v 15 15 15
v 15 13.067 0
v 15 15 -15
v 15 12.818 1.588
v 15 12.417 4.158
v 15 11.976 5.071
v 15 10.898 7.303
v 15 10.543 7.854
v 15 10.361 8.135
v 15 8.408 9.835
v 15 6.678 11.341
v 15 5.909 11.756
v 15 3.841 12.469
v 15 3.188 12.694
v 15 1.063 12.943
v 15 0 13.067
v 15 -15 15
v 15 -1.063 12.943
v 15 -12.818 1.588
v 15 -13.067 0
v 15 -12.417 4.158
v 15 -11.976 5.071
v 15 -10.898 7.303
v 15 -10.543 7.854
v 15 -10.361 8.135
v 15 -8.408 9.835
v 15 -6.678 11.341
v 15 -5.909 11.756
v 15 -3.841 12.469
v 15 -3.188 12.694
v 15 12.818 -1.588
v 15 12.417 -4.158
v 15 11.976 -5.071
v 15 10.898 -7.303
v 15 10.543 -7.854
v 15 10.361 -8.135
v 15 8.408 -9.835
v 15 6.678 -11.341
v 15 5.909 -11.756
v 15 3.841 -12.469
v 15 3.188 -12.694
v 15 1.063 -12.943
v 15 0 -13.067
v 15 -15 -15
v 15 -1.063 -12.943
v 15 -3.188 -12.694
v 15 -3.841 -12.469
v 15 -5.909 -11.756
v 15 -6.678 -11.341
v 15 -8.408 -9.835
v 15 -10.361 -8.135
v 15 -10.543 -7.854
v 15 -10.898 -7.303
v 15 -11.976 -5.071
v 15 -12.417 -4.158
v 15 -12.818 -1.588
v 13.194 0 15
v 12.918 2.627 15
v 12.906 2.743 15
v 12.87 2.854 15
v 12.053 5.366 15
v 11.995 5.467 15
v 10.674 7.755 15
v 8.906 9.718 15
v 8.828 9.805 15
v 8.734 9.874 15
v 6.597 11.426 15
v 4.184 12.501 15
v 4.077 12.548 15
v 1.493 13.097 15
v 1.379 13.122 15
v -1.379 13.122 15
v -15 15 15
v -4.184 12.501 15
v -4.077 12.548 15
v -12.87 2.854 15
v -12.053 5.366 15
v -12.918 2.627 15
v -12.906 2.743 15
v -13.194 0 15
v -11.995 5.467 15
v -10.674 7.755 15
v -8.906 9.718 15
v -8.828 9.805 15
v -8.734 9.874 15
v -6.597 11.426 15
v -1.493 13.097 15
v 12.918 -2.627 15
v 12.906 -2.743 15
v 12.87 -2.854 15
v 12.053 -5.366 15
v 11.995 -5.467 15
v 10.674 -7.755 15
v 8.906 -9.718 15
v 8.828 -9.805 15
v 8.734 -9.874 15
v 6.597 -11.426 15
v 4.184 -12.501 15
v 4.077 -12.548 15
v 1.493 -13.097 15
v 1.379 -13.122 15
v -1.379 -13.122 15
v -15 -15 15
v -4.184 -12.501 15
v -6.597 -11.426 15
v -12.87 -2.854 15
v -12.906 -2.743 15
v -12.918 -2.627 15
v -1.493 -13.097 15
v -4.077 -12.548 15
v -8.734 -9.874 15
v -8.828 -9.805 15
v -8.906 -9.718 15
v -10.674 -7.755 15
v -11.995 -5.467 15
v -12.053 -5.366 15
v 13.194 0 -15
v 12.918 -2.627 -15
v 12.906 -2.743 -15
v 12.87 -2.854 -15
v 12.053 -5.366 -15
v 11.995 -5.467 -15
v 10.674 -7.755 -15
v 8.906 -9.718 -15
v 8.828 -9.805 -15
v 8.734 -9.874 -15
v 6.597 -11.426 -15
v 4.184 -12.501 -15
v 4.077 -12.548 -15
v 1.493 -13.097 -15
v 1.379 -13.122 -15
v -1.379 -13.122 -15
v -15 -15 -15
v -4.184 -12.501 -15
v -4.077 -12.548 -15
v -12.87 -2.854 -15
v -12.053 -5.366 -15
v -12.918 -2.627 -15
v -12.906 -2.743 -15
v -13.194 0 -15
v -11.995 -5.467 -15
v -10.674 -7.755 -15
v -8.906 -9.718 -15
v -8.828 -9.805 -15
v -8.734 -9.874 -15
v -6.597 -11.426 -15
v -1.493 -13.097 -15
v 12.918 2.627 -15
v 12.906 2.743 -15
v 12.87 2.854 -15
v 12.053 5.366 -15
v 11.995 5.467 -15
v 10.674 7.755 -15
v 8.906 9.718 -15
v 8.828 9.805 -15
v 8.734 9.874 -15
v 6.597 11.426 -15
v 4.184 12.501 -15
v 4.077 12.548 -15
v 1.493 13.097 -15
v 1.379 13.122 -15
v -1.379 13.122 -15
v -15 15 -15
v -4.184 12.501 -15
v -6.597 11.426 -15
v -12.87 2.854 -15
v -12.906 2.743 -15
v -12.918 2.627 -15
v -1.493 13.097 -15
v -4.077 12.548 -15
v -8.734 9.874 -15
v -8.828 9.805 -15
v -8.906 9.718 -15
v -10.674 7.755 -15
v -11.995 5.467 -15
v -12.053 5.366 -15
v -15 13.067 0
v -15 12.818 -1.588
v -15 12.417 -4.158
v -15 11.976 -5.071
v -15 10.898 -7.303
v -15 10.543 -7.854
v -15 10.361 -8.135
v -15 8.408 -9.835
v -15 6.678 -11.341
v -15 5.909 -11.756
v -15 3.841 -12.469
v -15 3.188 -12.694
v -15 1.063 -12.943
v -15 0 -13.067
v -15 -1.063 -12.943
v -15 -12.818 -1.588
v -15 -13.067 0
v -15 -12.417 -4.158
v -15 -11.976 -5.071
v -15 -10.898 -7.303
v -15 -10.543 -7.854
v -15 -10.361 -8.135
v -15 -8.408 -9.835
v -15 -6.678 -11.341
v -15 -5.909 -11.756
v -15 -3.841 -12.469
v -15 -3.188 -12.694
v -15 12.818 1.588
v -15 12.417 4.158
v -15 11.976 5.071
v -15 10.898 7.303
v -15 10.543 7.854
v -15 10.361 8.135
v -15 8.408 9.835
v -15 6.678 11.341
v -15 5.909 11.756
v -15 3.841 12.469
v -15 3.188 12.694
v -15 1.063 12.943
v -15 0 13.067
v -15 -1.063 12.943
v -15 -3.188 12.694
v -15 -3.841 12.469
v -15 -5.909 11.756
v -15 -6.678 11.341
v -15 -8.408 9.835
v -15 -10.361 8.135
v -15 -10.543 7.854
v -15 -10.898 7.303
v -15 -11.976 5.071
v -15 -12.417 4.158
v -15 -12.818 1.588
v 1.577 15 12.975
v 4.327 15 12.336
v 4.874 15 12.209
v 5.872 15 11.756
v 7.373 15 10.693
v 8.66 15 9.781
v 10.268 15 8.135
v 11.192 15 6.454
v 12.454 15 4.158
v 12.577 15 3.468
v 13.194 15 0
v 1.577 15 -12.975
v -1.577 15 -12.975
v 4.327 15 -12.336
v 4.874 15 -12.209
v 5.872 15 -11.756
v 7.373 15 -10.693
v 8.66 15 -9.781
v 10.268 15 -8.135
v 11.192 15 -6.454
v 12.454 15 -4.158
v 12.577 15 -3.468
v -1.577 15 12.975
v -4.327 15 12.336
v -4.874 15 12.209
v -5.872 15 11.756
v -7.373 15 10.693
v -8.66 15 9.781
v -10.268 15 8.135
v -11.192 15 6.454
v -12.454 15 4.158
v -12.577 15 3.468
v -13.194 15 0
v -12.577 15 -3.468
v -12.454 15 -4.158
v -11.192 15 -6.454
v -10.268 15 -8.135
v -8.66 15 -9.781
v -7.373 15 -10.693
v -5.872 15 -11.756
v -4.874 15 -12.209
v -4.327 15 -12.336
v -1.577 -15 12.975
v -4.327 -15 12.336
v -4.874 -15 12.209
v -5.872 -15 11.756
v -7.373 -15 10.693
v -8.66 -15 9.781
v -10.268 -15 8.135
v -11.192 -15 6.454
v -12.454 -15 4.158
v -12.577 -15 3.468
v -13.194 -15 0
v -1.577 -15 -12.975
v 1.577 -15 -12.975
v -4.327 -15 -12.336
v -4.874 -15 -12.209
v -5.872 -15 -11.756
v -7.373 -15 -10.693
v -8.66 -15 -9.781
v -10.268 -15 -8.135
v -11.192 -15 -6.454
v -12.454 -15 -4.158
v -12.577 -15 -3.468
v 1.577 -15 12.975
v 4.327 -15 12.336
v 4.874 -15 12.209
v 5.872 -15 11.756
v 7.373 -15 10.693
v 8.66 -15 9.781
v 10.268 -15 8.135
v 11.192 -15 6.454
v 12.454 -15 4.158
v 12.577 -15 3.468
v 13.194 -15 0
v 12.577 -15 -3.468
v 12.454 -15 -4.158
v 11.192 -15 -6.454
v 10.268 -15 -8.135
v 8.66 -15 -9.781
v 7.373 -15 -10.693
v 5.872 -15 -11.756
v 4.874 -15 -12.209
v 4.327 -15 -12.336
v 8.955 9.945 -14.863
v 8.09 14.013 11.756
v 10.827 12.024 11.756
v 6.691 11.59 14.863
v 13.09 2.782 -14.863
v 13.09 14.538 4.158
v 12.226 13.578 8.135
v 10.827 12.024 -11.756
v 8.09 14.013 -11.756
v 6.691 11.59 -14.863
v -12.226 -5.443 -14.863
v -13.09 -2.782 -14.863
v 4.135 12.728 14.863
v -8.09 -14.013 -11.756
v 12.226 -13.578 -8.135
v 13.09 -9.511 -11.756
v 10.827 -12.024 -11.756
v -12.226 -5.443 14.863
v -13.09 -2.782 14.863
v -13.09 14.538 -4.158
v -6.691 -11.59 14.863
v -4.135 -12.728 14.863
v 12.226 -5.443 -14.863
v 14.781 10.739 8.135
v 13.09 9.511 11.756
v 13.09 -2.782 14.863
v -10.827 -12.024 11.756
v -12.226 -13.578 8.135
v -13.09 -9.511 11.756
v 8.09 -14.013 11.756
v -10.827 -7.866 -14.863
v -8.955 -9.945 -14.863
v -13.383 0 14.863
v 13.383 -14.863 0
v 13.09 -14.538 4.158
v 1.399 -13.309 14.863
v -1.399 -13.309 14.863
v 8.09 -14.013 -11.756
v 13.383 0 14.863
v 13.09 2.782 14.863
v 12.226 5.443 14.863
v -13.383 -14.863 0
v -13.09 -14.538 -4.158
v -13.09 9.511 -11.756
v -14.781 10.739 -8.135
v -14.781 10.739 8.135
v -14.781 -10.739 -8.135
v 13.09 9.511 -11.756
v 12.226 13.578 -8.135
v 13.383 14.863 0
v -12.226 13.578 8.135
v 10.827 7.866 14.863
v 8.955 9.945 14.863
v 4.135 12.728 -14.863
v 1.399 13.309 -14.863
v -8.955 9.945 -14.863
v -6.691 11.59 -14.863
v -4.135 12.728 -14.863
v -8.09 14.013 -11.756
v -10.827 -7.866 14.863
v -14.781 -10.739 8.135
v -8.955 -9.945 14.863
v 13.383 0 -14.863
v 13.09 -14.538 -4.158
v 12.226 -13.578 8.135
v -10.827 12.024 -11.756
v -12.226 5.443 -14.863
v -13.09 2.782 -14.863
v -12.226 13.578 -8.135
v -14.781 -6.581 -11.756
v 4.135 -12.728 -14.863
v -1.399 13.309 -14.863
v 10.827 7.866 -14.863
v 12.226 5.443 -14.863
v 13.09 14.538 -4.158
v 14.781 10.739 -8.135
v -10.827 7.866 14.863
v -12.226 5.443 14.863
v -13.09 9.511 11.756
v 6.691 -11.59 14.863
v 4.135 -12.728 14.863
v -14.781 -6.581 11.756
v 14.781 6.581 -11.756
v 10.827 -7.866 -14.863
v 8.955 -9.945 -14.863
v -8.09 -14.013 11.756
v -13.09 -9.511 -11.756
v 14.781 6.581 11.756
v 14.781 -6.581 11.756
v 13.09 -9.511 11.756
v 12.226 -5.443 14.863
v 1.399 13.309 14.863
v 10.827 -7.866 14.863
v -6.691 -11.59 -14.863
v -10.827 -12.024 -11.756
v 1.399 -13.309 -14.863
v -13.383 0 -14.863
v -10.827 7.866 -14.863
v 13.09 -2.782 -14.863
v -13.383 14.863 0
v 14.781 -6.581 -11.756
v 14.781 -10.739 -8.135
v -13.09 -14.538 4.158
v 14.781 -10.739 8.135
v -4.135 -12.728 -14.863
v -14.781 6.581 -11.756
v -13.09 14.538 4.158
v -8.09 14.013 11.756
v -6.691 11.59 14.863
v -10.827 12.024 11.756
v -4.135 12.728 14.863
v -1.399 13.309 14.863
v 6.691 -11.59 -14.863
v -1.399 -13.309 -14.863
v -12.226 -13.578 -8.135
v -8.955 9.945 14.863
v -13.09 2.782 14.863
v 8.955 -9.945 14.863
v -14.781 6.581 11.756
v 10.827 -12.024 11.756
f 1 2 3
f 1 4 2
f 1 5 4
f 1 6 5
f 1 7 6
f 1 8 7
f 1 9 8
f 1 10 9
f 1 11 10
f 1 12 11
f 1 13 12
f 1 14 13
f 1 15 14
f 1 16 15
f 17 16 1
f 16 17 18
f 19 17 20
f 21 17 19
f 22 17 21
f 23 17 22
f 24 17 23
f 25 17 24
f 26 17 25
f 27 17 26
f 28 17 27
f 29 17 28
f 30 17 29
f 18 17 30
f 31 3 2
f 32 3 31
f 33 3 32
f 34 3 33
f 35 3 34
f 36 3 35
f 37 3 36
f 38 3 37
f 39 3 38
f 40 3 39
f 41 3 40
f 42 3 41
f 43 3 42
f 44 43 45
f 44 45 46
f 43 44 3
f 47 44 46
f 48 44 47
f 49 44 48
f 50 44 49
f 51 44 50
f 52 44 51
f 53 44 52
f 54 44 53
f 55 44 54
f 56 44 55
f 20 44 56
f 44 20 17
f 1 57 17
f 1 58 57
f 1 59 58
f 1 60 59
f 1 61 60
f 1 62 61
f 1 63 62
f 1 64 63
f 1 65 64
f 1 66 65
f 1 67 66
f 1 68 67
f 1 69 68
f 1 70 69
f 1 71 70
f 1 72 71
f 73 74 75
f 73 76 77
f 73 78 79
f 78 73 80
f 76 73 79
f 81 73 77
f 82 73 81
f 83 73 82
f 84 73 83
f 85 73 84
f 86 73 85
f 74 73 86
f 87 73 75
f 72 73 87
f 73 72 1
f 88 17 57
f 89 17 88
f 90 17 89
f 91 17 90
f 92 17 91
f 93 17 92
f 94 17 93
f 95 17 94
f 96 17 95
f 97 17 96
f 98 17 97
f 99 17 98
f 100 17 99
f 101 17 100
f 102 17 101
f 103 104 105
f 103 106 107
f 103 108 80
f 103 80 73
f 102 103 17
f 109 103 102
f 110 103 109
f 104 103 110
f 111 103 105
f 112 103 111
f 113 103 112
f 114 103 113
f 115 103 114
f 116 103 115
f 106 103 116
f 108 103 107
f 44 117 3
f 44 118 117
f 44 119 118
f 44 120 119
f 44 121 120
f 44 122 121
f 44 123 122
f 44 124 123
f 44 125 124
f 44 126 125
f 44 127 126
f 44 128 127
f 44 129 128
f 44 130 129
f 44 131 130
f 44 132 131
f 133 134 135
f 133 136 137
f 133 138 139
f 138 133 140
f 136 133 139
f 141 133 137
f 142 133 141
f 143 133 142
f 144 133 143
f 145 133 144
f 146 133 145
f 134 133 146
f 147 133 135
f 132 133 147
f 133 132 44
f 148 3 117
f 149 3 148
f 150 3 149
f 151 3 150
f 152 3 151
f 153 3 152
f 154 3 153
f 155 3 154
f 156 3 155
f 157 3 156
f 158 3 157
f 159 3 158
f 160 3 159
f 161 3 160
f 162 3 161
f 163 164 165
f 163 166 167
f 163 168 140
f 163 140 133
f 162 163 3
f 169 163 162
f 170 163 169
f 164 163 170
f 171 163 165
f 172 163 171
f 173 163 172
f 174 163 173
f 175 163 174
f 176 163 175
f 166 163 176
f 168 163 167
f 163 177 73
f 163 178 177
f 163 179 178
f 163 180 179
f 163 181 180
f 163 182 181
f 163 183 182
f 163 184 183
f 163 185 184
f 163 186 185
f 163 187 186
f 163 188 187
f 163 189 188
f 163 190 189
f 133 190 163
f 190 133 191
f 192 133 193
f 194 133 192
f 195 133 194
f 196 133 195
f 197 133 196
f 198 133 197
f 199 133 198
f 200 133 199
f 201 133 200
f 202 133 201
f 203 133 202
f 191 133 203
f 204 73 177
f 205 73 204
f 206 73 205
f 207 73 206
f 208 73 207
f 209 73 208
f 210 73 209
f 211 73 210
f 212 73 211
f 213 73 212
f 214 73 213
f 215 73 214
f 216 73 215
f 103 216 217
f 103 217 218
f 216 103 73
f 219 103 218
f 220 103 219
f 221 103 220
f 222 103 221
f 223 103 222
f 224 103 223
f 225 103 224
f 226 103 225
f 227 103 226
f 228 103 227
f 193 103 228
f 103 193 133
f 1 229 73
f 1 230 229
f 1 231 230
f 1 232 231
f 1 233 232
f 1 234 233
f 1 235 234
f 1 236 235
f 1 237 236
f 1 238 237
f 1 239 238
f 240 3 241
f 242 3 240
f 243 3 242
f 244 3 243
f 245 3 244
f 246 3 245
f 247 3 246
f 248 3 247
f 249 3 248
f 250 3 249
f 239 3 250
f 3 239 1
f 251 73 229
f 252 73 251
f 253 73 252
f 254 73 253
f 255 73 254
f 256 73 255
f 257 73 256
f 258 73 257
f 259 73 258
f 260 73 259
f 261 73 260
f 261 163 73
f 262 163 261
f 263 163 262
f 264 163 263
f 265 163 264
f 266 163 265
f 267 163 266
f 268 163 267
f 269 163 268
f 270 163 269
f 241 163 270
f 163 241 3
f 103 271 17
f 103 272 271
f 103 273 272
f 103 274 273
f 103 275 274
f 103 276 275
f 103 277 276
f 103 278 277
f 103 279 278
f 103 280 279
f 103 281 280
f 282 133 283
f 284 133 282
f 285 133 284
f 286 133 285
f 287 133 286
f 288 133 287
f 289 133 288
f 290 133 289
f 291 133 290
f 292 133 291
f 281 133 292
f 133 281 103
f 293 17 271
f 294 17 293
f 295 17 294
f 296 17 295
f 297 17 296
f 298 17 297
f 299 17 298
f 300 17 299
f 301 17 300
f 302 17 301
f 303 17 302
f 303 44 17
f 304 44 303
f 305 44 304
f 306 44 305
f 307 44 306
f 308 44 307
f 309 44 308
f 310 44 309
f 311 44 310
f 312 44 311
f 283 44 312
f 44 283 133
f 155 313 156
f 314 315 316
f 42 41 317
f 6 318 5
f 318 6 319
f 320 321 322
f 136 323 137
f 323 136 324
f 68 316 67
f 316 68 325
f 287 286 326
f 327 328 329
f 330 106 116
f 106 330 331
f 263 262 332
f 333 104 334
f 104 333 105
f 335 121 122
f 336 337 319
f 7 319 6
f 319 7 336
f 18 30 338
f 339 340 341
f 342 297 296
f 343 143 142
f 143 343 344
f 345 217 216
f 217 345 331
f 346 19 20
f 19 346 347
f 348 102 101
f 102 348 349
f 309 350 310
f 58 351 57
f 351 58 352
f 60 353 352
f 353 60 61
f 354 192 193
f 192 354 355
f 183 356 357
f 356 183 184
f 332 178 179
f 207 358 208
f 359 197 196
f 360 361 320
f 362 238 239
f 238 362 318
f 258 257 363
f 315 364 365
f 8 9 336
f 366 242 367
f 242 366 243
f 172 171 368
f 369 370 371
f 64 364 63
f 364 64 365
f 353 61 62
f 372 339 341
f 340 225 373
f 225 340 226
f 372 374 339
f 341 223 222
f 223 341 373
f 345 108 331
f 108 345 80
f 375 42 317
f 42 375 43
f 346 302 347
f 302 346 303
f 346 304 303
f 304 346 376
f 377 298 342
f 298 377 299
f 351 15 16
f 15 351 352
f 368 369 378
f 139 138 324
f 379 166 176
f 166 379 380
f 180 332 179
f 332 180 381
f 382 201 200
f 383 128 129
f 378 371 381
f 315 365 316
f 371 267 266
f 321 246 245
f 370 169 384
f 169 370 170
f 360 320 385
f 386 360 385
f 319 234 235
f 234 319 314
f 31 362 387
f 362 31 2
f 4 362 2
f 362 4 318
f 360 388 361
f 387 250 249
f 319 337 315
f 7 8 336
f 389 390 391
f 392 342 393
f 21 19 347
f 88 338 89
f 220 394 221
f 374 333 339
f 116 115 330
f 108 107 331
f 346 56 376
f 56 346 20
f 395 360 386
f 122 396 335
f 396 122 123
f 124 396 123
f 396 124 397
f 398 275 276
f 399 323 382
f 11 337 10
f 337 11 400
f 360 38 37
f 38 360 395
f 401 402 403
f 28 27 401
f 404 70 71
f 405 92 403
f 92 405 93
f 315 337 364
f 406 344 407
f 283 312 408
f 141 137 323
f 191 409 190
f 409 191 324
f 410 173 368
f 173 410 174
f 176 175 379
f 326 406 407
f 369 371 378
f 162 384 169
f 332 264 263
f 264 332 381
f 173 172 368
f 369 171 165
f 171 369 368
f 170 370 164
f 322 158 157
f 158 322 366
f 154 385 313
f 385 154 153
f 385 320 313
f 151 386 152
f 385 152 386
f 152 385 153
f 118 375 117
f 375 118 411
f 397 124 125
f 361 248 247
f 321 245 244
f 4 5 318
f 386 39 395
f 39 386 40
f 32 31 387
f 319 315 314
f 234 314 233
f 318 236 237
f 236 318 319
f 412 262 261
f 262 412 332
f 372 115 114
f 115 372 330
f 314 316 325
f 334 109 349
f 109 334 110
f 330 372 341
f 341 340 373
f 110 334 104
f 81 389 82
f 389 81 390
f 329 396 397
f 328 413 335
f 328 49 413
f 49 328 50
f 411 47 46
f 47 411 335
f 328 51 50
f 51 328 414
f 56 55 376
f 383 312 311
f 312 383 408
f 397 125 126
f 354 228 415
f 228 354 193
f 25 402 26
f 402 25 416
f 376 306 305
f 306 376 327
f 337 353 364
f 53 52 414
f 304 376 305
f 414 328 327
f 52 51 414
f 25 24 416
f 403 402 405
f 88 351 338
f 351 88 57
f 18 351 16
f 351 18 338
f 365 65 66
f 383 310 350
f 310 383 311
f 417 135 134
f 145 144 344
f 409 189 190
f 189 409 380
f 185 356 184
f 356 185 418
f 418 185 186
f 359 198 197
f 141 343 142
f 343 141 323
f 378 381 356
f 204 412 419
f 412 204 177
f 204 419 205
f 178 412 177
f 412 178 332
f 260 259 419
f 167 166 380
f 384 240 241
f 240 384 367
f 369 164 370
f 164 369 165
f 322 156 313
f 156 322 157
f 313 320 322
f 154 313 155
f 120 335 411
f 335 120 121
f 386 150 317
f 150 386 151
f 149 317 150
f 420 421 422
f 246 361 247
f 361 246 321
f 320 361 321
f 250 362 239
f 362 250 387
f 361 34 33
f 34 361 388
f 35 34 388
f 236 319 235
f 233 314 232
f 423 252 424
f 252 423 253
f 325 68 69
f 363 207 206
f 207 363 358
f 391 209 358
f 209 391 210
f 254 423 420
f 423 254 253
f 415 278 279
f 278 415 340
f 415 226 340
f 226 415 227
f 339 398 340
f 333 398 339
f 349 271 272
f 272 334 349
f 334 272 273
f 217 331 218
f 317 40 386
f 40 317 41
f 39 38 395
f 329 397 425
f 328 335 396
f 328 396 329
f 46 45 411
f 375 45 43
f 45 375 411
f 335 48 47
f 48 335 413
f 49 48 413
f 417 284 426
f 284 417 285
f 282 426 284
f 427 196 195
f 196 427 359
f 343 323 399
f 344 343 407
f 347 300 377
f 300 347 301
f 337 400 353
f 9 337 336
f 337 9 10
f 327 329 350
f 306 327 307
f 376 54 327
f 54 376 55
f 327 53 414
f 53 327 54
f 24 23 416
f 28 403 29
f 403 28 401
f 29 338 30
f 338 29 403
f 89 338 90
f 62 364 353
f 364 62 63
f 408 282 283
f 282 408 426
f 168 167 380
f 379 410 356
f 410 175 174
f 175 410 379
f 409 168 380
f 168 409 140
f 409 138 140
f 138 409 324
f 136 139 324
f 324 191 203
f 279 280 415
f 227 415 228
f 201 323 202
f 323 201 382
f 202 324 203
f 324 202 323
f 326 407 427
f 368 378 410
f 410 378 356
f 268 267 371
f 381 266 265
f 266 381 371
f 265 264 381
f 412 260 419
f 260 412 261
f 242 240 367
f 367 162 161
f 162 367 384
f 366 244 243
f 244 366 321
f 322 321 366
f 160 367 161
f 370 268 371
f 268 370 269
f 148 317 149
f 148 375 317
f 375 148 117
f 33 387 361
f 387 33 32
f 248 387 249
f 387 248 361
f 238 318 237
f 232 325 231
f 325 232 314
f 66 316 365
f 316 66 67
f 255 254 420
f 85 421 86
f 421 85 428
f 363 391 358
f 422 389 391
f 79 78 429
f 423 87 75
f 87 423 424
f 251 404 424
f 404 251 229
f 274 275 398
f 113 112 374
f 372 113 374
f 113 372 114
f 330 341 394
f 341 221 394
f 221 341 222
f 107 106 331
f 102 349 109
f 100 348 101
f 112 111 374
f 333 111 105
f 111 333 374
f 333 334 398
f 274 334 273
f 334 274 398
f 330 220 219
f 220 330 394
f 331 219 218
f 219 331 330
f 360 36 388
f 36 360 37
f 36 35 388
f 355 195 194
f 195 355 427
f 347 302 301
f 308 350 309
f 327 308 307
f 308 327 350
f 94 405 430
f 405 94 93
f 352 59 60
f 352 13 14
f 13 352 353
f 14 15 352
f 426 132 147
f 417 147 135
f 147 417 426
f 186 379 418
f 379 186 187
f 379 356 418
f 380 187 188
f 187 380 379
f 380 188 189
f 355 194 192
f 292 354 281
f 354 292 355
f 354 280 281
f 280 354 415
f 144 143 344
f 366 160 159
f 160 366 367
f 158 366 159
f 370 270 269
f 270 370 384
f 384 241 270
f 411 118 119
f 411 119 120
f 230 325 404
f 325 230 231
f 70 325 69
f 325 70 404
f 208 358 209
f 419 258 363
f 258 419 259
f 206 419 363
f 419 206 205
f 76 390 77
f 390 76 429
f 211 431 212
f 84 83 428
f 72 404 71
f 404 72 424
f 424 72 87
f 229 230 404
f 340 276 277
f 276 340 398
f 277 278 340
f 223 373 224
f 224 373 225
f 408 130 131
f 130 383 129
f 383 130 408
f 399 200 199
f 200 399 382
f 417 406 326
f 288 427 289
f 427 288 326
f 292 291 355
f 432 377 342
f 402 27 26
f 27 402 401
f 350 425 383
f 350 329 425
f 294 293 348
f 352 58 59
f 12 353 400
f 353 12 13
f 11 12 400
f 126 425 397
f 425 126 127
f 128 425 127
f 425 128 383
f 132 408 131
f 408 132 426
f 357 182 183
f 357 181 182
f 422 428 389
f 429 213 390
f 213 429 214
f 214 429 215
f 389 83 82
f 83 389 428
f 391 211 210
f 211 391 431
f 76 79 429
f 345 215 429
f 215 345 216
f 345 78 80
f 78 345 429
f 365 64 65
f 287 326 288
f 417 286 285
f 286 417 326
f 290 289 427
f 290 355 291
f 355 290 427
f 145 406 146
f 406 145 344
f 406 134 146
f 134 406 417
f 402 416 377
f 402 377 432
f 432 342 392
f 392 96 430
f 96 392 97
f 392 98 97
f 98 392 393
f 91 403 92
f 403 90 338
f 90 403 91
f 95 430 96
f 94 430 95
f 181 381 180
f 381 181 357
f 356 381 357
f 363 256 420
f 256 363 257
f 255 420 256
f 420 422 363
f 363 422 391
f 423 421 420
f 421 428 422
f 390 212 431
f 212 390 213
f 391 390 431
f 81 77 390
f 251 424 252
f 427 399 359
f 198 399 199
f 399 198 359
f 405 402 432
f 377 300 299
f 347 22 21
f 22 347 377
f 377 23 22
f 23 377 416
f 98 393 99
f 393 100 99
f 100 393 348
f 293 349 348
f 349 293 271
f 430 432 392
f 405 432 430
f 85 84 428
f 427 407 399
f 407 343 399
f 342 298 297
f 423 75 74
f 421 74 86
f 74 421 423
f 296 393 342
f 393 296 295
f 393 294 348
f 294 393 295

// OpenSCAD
difference(){cube(size = [30, 30, 30], center = true);
sphere(r = 20.000);
}
